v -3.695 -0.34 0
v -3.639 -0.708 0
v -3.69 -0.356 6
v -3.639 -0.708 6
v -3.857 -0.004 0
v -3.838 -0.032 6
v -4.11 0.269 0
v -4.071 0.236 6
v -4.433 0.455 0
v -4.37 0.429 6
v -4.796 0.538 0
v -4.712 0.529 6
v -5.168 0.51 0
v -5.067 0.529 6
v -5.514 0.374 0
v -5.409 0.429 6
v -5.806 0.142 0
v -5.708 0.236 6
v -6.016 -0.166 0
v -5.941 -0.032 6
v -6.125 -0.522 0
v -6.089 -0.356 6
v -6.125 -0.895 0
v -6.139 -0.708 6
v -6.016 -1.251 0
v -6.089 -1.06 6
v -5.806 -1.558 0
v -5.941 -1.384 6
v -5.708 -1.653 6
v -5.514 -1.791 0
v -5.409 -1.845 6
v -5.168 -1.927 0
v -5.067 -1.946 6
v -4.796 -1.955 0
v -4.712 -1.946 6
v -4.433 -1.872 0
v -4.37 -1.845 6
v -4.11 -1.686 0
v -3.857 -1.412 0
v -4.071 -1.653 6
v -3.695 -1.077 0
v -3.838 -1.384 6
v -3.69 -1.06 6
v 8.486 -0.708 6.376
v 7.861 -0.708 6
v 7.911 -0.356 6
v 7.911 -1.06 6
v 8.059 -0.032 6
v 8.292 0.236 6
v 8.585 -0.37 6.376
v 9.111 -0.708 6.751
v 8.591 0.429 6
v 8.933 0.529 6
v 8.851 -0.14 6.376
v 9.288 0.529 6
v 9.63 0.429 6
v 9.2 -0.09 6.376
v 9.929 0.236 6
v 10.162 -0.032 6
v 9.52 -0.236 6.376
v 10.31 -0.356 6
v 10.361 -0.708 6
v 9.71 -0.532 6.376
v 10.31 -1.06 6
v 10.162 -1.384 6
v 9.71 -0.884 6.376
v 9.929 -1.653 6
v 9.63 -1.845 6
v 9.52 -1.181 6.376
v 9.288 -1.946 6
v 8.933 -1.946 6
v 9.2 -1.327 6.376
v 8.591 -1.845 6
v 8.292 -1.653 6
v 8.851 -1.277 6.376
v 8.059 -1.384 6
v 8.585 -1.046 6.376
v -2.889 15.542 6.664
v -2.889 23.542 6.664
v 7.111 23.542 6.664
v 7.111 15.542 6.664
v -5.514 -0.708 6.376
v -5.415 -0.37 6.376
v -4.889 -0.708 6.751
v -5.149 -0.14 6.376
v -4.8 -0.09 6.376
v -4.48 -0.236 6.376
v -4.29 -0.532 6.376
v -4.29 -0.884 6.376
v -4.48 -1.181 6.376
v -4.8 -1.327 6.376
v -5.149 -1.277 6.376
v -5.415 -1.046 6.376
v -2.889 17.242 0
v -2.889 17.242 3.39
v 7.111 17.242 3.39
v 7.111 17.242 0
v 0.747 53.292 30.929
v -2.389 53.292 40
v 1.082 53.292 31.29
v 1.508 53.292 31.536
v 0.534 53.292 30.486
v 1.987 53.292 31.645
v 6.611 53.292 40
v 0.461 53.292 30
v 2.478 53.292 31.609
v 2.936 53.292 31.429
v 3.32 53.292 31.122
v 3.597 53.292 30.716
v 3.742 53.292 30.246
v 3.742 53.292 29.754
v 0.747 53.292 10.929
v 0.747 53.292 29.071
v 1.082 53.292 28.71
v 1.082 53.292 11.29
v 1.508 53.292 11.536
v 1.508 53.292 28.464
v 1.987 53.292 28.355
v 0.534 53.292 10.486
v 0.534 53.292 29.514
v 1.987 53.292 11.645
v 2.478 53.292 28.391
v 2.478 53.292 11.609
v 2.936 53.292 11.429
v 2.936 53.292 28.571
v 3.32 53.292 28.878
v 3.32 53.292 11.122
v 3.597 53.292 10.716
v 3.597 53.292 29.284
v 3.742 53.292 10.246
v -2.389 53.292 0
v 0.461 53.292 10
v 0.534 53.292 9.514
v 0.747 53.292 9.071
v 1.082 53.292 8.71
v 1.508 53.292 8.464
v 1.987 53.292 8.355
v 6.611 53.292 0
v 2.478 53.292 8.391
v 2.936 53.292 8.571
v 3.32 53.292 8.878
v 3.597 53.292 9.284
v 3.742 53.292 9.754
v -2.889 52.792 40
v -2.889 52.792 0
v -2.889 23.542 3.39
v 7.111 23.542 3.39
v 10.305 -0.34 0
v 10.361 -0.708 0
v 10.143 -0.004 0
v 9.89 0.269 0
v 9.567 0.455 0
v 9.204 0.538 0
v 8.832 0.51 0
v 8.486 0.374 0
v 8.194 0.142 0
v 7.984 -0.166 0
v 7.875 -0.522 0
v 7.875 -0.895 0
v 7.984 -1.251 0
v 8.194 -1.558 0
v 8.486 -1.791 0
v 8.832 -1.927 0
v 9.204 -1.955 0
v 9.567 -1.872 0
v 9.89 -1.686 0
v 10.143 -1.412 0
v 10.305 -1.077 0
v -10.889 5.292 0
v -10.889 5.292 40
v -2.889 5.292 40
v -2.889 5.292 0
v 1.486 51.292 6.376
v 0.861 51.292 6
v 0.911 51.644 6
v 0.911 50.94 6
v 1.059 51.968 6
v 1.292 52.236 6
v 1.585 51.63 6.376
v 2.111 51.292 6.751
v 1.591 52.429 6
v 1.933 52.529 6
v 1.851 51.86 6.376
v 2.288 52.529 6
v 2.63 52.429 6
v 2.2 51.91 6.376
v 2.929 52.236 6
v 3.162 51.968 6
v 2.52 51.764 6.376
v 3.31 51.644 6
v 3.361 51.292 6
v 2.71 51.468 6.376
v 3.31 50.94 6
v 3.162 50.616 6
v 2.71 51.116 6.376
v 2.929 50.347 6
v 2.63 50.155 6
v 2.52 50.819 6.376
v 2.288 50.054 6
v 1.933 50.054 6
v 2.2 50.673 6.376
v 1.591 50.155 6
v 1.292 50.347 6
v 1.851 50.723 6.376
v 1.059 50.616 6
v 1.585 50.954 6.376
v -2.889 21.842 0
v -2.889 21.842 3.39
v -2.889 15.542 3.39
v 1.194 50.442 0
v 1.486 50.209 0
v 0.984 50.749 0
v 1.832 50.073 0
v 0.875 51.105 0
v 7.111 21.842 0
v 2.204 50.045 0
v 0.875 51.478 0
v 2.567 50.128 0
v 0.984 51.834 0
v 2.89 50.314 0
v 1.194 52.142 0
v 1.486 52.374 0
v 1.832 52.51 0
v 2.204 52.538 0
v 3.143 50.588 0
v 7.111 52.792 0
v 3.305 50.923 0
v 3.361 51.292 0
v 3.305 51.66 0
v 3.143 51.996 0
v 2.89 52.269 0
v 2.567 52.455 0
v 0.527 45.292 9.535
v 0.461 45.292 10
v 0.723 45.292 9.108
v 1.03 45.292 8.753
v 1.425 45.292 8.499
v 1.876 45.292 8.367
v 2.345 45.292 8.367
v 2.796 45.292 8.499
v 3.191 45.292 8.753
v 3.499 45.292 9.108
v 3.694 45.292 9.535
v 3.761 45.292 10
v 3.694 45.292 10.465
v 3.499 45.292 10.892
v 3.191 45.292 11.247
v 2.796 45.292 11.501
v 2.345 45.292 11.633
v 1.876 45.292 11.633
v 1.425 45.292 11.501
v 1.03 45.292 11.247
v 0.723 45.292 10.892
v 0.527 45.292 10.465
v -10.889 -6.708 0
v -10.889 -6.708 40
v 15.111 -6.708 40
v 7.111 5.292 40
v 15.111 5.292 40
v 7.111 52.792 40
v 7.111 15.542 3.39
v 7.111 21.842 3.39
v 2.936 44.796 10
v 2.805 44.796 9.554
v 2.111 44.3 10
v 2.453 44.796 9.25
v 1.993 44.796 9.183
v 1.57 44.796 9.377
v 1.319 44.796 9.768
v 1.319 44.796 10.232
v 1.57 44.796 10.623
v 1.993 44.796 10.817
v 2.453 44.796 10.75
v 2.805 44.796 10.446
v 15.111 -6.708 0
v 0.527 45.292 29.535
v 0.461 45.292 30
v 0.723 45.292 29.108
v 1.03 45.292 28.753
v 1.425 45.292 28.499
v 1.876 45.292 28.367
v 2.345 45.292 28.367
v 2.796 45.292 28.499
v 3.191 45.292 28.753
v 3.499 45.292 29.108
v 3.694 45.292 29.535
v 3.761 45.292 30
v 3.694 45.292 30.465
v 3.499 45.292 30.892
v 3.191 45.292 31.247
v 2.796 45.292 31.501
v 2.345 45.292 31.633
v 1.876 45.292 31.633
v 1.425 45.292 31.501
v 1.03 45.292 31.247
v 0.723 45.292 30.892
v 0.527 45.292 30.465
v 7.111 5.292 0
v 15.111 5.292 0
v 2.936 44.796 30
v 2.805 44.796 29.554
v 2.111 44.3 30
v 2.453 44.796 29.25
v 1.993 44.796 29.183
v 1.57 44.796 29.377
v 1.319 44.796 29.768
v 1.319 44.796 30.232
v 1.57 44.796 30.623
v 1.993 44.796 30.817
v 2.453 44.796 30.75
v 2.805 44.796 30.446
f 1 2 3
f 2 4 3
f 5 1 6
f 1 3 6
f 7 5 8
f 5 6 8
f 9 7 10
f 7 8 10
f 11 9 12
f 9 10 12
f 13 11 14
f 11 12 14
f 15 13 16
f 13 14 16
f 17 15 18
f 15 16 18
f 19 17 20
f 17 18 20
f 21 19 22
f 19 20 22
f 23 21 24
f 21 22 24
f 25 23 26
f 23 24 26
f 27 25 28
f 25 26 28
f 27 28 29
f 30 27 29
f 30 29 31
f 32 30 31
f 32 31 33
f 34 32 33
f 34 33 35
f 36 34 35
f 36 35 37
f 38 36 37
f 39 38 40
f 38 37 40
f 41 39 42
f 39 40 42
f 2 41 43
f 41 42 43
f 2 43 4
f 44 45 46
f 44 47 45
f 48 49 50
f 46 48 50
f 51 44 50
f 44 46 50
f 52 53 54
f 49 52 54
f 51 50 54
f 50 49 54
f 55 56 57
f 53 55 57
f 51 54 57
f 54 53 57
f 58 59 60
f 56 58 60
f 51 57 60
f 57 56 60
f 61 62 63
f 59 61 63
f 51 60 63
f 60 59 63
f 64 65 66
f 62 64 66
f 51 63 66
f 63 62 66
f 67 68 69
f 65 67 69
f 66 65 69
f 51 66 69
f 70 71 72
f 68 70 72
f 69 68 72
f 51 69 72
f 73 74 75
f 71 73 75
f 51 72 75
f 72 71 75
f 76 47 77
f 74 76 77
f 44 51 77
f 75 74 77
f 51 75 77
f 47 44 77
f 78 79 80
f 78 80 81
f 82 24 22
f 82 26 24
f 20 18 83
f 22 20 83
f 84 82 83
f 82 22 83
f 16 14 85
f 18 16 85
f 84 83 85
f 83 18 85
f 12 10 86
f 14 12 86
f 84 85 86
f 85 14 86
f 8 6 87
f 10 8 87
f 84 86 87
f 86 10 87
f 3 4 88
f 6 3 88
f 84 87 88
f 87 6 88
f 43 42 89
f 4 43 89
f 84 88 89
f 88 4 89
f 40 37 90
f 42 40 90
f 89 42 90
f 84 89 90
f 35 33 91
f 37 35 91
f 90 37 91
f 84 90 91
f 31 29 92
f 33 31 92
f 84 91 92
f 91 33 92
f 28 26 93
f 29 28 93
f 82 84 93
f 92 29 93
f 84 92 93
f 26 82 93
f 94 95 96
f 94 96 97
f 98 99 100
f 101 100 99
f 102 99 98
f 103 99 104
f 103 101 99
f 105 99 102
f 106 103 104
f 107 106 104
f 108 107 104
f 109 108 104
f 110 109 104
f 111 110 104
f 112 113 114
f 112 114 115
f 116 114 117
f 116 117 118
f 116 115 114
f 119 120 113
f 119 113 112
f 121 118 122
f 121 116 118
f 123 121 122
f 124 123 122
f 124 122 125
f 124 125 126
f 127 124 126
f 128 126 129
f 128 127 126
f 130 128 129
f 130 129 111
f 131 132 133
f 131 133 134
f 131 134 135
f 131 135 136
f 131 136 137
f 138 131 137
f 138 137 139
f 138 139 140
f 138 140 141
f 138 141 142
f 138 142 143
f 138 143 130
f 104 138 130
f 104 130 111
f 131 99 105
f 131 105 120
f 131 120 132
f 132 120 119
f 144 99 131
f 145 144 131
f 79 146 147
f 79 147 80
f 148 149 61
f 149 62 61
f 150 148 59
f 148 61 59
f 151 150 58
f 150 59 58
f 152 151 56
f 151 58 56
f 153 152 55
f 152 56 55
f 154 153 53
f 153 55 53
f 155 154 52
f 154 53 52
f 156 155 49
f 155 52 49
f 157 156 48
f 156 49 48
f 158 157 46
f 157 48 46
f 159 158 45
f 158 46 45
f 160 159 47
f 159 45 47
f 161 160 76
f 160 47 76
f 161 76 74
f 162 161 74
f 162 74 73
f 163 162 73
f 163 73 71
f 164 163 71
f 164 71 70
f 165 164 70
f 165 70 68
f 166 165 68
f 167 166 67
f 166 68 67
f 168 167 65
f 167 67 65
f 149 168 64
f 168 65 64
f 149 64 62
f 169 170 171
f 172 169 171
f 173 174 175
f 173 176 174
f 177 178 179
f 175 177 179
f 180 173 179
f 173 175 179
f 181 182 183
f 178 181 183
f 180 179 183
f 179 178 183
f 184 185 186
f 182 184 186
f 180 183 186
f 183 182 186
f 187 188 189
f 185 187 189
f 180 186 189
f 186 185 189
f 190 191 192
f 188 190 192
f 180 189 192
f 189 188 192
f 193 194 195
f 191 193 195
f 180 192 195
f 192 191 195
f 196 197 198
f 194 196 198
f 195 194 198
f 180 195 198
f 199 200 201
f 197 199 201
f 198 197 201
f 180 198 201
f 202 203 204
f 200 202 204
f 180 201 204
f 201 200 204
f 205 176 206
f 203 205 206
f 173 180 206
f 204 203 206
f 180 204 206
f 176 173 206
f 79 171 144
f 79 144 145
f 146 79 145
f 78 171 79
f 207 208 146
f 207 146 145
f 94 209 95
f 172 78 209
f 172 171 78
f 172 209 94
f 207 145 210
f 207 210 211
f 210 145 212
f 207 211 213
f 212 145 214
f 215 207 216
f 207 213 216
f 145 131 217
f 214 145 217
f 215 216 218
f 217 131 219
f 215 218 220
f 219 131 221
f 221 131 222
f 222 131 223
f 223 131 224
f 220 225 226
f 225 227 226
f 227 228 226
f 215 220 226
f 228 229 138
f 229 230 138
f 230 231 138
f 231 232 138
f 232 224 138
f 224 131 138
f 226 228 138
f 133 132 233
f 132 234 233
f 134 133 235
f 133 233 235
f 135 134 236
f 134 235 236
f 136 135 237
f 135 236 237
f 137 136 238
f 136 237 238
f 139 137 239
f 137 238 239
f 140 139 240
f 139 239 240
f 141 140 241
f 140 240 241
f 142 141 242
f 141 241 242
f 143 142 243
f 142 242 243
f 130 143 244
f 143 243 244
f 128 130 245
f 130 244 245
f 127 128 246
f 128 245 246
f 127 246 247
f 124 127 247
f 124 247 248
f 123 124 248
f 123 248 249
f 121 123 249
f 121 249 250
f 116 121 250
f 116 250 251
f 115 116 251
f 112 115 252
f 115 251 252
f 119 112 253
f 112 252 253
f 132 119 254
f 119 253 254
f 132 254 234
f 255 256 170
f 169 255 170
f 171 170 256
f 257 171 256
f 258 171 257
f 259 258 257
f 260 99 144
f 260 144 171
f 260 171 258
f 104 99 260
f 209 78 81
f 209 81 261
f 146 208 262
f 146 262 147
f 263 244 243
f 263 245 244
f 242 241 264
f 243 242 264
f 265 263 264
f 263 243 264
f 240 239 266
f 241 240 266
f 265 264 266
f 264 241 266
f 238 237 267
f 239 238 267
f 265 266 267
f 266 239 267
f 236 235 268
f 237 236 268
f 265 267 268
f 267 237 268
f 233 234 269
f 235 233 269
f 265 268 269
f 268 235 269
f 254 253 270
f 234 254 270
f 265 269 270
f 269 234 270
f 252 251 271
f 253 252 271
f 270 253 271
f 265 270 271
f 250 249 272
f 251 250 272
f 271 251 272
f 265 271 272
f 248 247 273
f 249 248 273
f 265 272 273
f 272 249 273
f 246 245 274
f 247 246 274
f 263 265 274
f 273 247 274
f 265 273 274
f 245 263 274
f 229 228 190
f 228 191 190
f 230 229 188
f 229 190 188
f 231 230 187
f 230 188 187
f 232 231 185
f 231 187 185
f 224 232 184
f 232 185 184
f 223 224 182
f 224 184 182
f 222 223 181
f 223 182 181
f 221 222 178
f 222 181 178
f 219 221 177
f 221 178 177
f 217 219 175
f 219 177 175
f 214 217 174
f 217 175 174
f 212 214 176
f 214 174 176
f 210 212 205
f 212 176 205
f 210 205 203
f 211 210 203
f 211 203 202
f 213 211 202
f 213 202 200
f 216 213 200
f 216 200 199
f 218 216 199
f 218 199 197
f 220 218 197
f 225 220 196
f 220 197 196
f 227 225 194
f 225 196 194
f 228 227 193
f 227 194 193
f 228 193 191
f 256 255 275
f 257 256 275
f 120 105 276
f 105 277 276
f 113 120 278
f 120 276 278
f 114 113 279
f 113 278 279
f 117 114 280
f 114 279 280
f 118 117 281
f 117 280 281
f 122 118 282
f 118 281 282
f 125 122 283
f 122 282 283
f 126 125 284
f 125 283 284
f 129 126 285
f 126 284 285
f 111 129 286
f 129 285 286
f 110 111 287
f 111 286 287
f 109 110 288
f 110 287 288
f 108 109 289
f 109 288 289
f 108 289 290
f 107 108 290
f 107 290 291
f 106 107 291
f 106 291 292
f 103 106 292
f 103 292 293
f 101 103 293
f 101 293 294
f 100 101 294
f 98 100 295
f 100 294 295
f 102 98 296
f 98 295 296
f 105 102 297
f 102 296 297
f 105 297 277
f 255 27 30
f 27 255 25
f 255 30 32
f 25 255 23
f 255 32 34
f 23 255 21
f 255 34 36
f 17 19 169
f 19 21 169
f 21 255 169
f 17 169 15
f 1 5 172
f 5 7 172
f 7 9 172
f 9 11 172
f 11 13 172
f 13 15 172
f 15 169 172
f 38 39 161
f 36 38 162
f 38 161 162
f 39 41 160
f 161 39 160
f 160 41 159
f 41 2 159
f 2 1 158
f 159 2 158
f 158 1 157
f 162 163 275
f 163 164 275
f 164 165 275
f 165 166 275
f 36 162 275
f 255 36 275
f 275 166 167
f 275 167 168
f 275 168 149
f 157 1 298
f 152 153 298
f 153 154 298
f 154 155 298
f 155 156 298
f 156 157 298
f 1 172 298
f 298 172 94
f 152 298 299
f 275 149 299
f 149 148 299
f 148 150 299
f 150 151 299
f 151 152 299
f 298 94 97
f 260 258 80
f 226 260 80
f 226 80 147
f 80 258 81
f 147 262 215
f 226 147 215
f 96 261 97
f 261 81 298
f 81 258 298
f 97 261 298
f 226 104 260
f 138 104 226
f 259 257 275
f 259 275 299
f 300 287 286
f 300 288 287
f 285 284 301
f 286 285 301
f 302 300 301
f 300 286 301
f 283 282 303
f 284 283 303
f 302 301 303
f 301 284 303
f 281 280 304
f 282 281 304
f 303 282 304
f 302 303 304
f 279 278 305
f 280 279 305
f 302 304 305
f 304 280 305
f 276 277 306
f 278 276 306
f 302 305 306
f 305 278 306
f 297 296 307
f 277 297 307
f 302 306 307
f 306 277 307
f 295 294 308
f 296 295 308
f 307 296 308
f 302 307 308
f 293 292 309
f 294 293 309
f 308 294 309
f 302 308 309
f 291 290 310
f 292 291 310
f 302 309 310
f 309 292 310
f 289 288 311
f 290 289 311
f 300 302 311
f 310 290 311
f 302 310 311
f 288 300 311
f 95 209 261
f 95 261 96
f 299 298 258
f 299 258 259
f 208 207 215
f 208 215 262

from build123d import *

# Parameters (mm, degrees)
SKETCH1_W             = 26
SKETCH1_H             = 12
BOSS_EXTRUDE1_DEPTH   = 40
SKETCH2_W             = 10
SKETCH2_H             = 40
BOSS_EXTRUDE2_DEPTH   = 48
CUT_EXTRUDE1_DEPTH    = 48
M3_TAPPED_HOLE1_D     = 2.5
M3_TAPPED_HOLE1_DEPTH = 6
M3_TAPPED_HOLE1_TIP   = 0.751075774
M4_TAPPED_HOLE1_D     = 3.3
M4_TAPPED_HOLE1_DEPTH = 8
M4_TAPPED_HOLE1_TIP   = 0.991420021
CHAMFER1_SIZE         = 0.5


with BuildPart() as part:
    # Sketch1 → Boss-Extrude1 (new body)
    with BuildSketch(Plane.XY):
        with Locations((2.110588235, -0.708235294)):
            Rectangle(SKETCH1_W, SKETCH1_H)
    extrude(amount=BOSS_EXTRUDE1_DEPTH)

    # Sketch2 → Boss-Extrude2 (add)
    with BuildSketch(Plane(origin=(0, 5.291764706, 0), x_dir=(1, 0, 0), z_dir=(0, 1, 0))):
        with Locations((2.110588235, -20)):
            Rectangle(SKETCH2_W, SKETCH2_H)
    extrude(amount=BOSS_EXTRUDE2_DEPTH)

    # Sketch3 → Cut-Extrude1 (cut)
    with BuildSketch(Plane.ZY.offset(2.889411765)):
        Polygon((0, 21.841764706), (3.389763468, 21.841764706), (3.389763468, 23.541764706), (6.66389663, 23.541764706), (6.66389663, 15.541764706), (3.389763468, 15.541764706), (3.389763468, 17.241764706), (0, 17.241764706), align=None)
    extrude(amount=-CUT_EXTRUDE1_DEPTH, mode=Mode.SUBTRACT)

    # M3 Tapped Hole1
    with Locations(Plane(origin=(0, 0, 0), x_dir=(-1, 0, 0), z_dir=(0, 0, -1))):
        with Locations((-9.110588235, -0.708235294), (4.889411765, -0.708235294), (-2.110588235, 51.291764706)):
            Hole(M3_TAPPED_HOLE1_D / 2, depth=M3_TAPPED_HOLE1_DEPTH)
            with Locations((0, 0, -(M3_TAPPED_HOLE1_DEPTH + M3_TAPPED_HOLE1_TIP / 2))):  # 118° drill point
                Cone(0, M3_TAPPED_HOLE1_D / 2, M3_TAPPED_HOLE1_TIP, mode=Mode.SUBTRACT)

    # M4 Tapped Hole1
    with Locations(Plane(origin=(0, 53.291764706, 0), x_dir=(1, 0, 0), z_dir=(0, 1, 0))):
        with Locations((2.110588235, -10), (2.110588235, -30)):
            Hole(M4_TAPPED_HOLE1_D / 2, depth=M4_TAPPED_HOLE1_DEPTH)
            with Locations((0, 0, -(M4_TAPPED_HOLE1_DEPTH + M4_TAPPED_HOLE1_TIP / 2))):  # 118° drill point
                Cone(0, M4_TAPPED_HOLE1_D / 2, M4_TAPPED_HOLE1_TIP, mode=Mode.SUBTRACT)

    # Chamfer1
    chamfer1_edges = [part.edges().sort_by_distance(p)[0] for p in [
        (-2.889411765, 53.291764706, 20),
        (7.110588235, 53.291764706, 20),
    ]]
    chamfer(chamfer1_edges, length=CHAMFER1_SIZE)


solid = part.part
